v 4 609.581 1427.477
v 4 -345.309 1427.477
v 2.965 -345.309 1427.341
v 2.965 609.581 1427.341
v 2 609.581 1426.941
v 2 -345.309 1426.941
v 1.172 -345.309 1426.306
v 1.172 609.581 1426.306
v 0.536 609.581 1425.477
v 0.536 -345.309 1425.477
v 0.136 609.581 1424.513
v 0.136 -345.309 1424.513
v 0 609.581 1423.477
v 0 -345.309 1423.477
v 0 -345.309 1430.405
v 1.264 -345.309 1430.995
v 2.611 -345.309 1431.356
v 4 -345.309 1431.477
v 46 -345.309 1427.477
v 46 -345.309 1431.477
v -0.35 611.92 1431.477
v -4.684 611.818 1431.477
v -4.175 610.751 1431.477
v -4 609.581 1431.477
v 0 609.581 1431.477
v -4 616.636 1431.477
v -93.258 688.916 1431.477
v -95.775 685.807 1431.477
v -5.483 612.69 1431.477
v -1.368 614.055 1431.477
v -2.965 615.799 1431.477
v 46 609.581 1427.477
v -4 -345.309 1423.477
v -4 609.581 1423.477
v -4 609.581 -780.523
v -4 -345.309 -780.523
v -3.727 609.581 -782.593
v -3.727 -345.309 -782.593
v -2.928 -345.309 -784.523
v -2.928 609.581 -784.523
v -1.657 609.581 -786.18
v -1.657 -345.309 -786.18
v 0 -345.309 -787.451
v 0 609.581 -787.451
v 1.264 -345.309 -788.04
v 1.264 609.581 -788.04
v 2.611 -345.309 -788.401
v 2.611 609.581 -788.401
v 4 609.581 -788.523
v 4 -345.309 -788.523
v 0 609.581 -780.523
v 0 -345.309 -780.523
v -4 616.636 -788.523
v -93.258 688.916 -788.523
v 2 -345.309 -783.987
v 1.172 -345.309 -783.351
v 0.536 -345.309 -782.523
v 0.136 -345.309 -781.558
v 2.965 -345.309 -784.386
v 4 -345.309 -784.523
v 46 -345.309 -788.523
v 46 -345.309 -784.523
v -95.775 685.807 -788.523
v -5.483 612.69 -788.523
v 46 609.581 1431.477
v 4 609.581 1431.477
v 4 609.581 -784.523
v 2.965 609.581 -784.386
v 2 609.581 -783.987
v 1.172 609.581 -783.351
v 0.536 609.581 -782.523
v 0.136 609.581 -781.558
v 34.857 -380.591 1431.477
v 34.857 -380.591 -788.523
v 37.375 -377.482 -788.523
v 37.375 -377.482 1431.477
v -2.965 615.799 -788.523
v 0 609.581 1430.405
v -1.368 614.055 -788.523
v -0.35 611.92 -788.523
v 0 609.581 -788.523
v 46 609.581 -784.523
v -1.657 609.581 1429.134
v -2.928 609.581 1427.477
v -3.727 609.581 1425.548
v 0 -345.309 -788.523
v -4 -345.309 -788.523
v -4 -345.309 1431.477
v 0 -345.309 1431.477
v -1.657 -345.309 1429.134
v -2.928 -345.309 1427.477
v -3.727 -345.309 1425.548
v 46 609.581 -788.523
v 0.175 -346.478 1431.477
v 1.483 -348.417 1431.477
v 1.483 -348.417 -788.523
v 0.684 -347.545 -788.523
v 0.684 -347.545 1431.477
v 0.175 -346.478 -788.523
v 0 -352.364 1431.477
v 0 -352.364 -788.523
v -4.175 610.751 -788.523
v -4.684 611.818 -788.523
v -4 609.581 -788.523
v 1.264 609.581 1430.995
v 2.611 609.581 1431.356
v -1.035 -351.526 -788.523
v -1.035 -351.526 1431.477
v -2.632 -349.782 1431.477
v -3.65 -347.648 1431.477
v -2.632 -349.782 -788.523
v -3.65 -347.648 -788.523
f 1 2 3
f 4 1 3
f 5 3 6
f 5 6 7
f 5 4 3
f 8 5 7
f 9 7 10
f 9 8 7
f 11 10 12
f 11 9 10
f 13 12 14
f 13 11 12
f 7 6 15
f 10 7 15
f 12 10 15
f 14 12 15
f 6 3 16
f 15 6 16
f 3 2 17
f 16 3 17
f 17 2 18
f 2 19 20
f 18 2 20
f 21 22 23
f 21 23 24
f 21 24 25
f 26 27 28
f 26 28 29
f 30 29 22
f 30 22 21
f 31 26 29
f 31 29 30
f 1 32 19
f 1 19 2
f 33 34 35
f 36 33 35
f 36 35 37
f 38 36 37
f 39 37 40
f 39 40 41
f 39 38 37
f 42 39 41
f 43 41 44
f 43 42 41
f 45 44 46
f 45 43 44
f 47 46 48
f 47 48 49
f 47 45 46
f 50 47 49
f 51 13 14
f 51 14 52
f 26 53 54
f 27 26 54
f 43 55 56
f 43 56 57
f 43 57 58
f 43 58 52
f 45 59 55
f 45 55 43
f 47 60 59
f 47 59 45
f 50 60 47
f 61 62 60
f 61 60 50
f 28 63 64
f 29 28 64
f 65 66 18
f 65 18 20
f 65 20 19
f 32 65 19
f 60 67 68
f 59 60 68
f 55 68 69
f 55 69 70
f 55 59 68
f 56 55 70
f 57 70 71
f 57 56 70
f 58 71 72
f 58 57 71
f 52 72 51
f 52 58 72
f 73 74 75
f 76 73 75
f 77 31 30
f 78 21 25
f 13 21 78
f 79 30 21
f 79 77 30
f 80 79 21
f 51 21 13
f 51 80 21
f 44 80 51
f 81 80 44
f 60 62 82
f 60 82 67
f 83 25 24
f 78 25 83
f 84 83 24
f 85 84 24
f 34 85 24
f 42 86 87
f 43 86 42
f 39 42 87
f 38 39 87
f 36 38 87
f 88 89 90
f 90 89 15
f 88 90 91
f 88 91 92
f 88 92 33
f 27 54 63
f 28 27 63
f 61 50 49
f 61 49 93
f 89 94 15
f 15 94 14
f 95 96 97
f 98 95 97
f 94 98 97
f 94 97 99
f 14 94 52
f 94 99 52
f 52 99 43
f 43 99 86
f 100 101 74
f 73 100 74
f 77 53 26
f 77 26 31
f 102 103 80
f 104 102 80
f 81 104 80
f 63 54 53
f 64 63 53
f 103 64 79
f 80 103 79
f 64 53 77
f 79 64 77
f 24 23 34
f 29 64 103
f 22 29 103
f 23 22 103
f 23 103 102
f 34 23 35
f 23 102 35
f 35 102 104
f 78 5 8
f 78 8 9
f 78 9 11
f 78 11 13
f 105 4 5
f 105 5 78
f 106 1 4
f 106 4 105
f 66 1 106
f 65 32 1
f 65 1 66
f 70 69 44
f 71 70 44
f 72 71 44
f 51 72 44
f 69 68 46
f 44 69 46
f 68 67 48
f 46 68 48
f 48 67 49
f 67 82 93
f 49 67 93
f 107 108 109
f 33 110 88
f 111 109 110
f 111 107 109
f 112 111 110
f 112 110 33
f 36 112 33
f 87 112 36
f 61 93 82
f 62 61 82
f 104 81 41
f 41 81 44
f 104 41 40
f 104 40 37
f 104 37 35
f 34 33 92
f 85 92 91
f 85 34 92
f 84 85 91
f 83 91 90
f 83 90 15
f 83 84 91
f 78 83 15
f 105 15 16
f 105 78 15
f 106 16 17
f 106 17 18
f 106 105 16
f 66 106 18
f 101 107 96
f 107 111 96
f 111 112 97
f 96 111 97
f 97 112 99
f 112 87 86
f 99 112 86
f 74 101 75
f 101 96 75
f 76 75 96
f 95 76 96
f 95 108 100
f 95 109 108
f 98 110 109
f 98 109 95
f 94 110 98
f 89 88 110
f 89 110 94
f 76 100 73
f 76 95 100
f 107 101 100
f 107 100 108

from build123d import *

# Parameters (mm, degrees)
SKETCH1_W                    = 2220
SKETCH1_H                    = 969
BASE_FLANGE1_DEPTH           = 4
EDGE_FLANGE1_START           = -788.522727273
EDGE_FLANGE1_DEPTH           = 2220
EDGE_FLANGE1_2_DEPTH         = 2220
EDGE_FLANGE2_START           = -788.522727273
EDGE_FLANGE2_DEPTH           = 2220
EDGE_FLANGE2_2_DEPTH         = 2220
EDGE_FLANGE3_STRIP_W         = 24
EDGE_FLANGE3_STRIP_H         = 4
EDGE_FLANGE3_STRIP_CUT_DEPTH = 954.890119211
EDGE_FLANGE3_DEPTH           = 954.890119211
EDGE_FLANGE4_STRIP_W         = 24
EDGE_FLANGE4_STRIP_H         = 4
EDGE_FLANGE4_STRIP_CUT_DEPTH = 954.890119211
EDGE_FLANGE4_DEPTH           = 954.890119211
CUT_EXTRUDE1_DEPTH           = 1665.285512579
LPATTERN1_COUNT              = 7
LPATTERN1_PITCH              = 300
CUT_EXTRUDE2_DEPTH           = 1665.285512579
CUT_EXTRUDE2_DEPTH_BACK      = 1665.285512579
SKETCH20_R                   = 7
CUT_EXTRUDE3_DEPTH           = 2327.408738422
LPATTERN2_COUNT              = 5
LPATTERN2_PITCH              = 190
CUT_EXTRUDE4_DEPTH           = 1704.883654617
LPATTERN3_COUNT              = 7
LPATTERN3_PITCH              = 300


# Read off the part's stored shape, not the designer's step: Edge-Flange1, Edge-Flange2
# Sheet-metal steps are written as plain solids
with BuildPart() as part:
    # Sketch1 → Base-Flange1 (new body)
    with BuildSketch(Plane(origin=(0, 0, 0), x_dir=(0, 0, -1), z_dir=(1, 0, 0))):
        with Locations((-321.477272727, 132.136363636)):
            Rectangle(SKETCH1_W, SKETCH1_H)
    extrude(amount=-BASE_FLANGE1_DEPTH)

    # Edge-Flange1 outline → Edge-Flange1 (cut)
    with BuildSketch(Plane.XY.offset(EDGE_FLANGE1_START)):
        with BuildLine():
            Line((-4, 616.636363636), (-2.965436872, 615.798590934))
            ThreePointArc((-2.965436872, 615.798590934), (-0.779317725, 613.025512017), (0, 609.581423242))
            Line((0, 609.581423242), (0, 616.636363636))
            Line((0, 616.636363636), (-4, 616.636363636))
        make_face()
    extrude(amount=EDGE_FLANGE1_DEPTH, mode=Mode.SUBTRACT)

    # Edge-Flange1 2 outline → Edge-Flange1 2 (add)
    with BuildSketch(Plane.XY.offset(EDGE_FLANGE1_START)):
        with BuildLine():
            Line((-4, 609.581423242), (-4, 616.636363636))
            Line((-4, 616.636363636), (-93.257515375, 688.91567443))
            Line((-93.257515375, 688.91567443), (-95.774796939, 685.807090584))
            Line((-95.774796939, 685.807090584), (-5.482718436, 612.690007088))
            ThreePointArc((-5.482718436, 612.690007088), (-4.389658863, 611.303467629), (-4, 609.581423242))
        make_face()
    extrude(amount=EDGE_FLANGE1_2_DEPTH)

    # Edge-Flange2 outline → Edge-Flange2 (cut)
    with BuildSketch(Plane.XY.offset(EDGE_FLANGE2_START)):
        with BuildLine():
            Line((0, -352.363636364), (-1.034563128, -351.525863661))
            ThreePointArc((-1.034563128, -351.525863661), (-3.220682275, -348.752784744), (-4, -345.308695969))
            Line((-4, -345.308695969), (-4, -352.363636364))
            Line((-4, -352.363636364), (0, -352.363636364))
        make_face()
    extrude(amount=EDGE_FLANGE2_DEPTH, mode=Mode.SUBTRACT)

    # Edge-Flange2 2 outline → Edge-Flange2 2 (add)
    with BuildSketch(Plane.XY.offset(EDGE_FLANGE2_START)):
        with BuildLine():
            Line((0, -345.308695969), (0, -352.363636364))
            Line((0, -352.363636364), (34.857298073, -380.590519783))
            Line((34.857298073, -380.590519783), (37.374579637, -377.481935938))
            Line((37.374579637, -377.481935938), (1.482718436, -348.417279815))
            ThreePointArc((1.482718436, -348.417279815), (0.389658863, -347.030740356), (0, -345.308695969))
        make_face()
    extrude(amount=EDGE_FLANGE2_2_DEPTH)

    # Edge-Flange3 strip (across the edge) → Edge-Flange3 strip cut (cut)
    with BuildSketch(Plane(origin=(0, 609.581423242, 1431.477272727), x_dir=(0, 0, -1), z_dir=(0, -1, 0))):
        with Locations((-4, -2)):
            Rectangle(EDGE_FLANGE3_STRIP_W, EDGE_FLANGE3_STRIP_H)
    extrude(amount=EDGE_FLANGE3_STRIP_CUT_DEPTH, mode=Mode.SUBTRACT)

    # Edge-Flange3 section (across the edge) → Edge-Flange3 (add)
    with BuildSketch(Plane(origin=(0, 609.581423242, 1431.477272727), x_dir=(0, 0, -1), z_dir=(0, -1, 0))):
        with BuildLine():
            Line((0, 4), (0, 46))
            Line((0, 46), (4, 46))
            Line((4, 46), (4, 4))
            ThreePointArc((4, 4), (5.171572875, 1.171572875), (8, 0))
            Line((8, 0), (8, -4))
            ThreePointArc((8, -4), (2.343145751, -1.656854249), (0, 4))
        make_face()
    extrude(amount=EDGE_FLANGE3_DEPTH)

    # Edge-Flange4 strip (across the edge) → Edge-Flange4 strip cut (cut)
    with BuildSketch(Plane(origin=(0, -345.308695969, -788.522727273), x_dir=(0, 0, 1), z_dir=(0, 1, 0))):
        with Locations((-4, -2)):
            Rectangle(EDGE_FLANGE4_STRIP_W, EDGE_FLANGE4_STRIP_H)
    extrude(amount=EDGE_FLANGE4_STRIP_CUT_DEPTH, mode=Mode.SUBTRACT)

    # Edge-Flange4 section (across the edge) → Edge-Flange4 (add)
    with BuildSketch(Plane(origin=(0, -345.308695969, -788.522727273), x_dir=(0, 0, 1), z_dir=(0, 1, 0))):
        with BuildLine():
            Line((0, 4), (0, 46))
            Line((0, 46), (4, 46))
            Line((4, 46), (4, 4))
            ThreePointArc((4, 4), (5.171572875, 1.171572875), (8, 0))
            Line((8, 0), (8, -4))
            ThreePointArc((8, -4), (2.343145751, -1.656854249), (0, 4))
        make_face()
    extrude(amount=EDGE_FLANGE4_DEPTH)

    # Sketch18 → Cut-Extrude1 (cut, symmetric)
    with BuildSketch(Plane(origin=(299.99651319, 370.464841108, 0), x_dir=(0.7771459614569677, -0.6293203910498413, 0), z_dir=(0.6293203910498414, 0.7771459614569678, 0))):
        with BuildLine():
            Line((-524.023383081, 943.522727273), (-524.023383081, 933.522727273))
            ThreePointArc((-524.023383081, 933.522727273), (-531.023383081, 926.522727273), (-538.023383081, 933.522727273))
            Line((-538.023383081, 933.522727273), (-538.023383081, 943.522727273))
            ThreePointArc((-538.023383081, 943.522727273), (-531.023383081, 950.522727273), (-524.023383081, 943.522727273))
        make_face()
    cut_extrude1 = extrude(amount=CUT_EXTRUDE1_DEPTH, both=True, mode=Mode.SUBTRACT)

    # LPattern1: Cut-Extrude1 ×7
    with Locations(*[(0, 0, i * LPATTERN1_PITCH) for i in range(1, LPATTERN1_COUNT)]):
        add(cut_extrude1, mode=Mode.SUBTRACT)

    # Sketch19 → Cut-Extrude2 (cut, two sides: drawn at the far end of the back side and taken through both)
    with BuildSketch(Plane(origin=(299.99651319, 370.464841108, 0), x_dir=(0.7771459614569677, -0.6293203910498413, 0), z_dir=(0.6293203910498414, 0.7771459614569678, 0)).offset(-CUT_EXTRUDE2_DEPTH_BACK)):
        with BuildLine():
            Line((484.914799236, -1336.477272727), (484.914799236, -1346.477272727))
            ThreePointArc((484.914799236, -1346.477272727), (477.914799236, -1353.477272727), (470.914799236, -1346.477272727))
            Line((470.914799236, -1346.477272727), (470.914799236, -1336.477272727))
            ThreePointArc((470.914799236, -1336.477272727), (477.914799236, -1329.477272727), (484.914799236, -1336.477272727))
        make_face()
    extrude(amount=CUT_EXTRUDE2_DEPTH + CUT_EXTRUDE2_DEPTH_BACK, mode=Mode.SUBTRACT)

    # Sketch20 → Cut-Extrude3 (cut, symmetric)
    with BuildSketch(Plane.XY.offset(1431.477272727)):
        with Locations((71, -246.525863661)):
            Circle(SKETCH20_R)
    cut_extrude3 = extrude(amount=CUT_EXTRUDE3_DEPTH, both=True, mode=Mode.SUBTRACT)

    # LPattern2: Cut-Extrude3 ×5
    with Locations(*[(0, -i * LPATTERN2_PITCH, 0) for i in range(1, LPATTERN2_COUNT)]):
        add(cut_extrude3, mode=Mode.SUBTRACT)

    # Sketch21 → Cut-Extrude4 (cut, symmetric)
    with BuildSketch(Plane(origin=(-169.814541183, -209.703494046, 0), x_dir=(0.7771459614569678, -0.6293203910498414, 0), z_dir=(0.6293203910498414, 0.7771459614569678, 0))):
        with BuildLine():
            Line((298.602583165, 943.522727273), (298.602583165, 933.522727273))
            ThreePointArc((298.602583165, 933.522727273), (291.602583165, 926.522727273), (284.602583165, 933.522727273))
            Line((284.602583165, 933.522727273), (284.602583165, 943.522727273))
            ThreePointArc((284.602583165, 943.522727273), (291.602583165, 950.522727273), (298.602583165, 943.522727273))
        make_face()
    cut_extrude4 = extrude(amount=CUT_EXTRUDE4_DEPTH, both=True, mode=Mode.SUBTRACT)

    # LPattern3: Cut-Extrude4 ×7
    with Locations(*[(0, 0, i * LPATTERN3_PITCH) for i in range(1, LPATTERN3_COUNT)]):
        add(cut_extrude4, mode=Mode.SUBTRACT)


solid = part.part
